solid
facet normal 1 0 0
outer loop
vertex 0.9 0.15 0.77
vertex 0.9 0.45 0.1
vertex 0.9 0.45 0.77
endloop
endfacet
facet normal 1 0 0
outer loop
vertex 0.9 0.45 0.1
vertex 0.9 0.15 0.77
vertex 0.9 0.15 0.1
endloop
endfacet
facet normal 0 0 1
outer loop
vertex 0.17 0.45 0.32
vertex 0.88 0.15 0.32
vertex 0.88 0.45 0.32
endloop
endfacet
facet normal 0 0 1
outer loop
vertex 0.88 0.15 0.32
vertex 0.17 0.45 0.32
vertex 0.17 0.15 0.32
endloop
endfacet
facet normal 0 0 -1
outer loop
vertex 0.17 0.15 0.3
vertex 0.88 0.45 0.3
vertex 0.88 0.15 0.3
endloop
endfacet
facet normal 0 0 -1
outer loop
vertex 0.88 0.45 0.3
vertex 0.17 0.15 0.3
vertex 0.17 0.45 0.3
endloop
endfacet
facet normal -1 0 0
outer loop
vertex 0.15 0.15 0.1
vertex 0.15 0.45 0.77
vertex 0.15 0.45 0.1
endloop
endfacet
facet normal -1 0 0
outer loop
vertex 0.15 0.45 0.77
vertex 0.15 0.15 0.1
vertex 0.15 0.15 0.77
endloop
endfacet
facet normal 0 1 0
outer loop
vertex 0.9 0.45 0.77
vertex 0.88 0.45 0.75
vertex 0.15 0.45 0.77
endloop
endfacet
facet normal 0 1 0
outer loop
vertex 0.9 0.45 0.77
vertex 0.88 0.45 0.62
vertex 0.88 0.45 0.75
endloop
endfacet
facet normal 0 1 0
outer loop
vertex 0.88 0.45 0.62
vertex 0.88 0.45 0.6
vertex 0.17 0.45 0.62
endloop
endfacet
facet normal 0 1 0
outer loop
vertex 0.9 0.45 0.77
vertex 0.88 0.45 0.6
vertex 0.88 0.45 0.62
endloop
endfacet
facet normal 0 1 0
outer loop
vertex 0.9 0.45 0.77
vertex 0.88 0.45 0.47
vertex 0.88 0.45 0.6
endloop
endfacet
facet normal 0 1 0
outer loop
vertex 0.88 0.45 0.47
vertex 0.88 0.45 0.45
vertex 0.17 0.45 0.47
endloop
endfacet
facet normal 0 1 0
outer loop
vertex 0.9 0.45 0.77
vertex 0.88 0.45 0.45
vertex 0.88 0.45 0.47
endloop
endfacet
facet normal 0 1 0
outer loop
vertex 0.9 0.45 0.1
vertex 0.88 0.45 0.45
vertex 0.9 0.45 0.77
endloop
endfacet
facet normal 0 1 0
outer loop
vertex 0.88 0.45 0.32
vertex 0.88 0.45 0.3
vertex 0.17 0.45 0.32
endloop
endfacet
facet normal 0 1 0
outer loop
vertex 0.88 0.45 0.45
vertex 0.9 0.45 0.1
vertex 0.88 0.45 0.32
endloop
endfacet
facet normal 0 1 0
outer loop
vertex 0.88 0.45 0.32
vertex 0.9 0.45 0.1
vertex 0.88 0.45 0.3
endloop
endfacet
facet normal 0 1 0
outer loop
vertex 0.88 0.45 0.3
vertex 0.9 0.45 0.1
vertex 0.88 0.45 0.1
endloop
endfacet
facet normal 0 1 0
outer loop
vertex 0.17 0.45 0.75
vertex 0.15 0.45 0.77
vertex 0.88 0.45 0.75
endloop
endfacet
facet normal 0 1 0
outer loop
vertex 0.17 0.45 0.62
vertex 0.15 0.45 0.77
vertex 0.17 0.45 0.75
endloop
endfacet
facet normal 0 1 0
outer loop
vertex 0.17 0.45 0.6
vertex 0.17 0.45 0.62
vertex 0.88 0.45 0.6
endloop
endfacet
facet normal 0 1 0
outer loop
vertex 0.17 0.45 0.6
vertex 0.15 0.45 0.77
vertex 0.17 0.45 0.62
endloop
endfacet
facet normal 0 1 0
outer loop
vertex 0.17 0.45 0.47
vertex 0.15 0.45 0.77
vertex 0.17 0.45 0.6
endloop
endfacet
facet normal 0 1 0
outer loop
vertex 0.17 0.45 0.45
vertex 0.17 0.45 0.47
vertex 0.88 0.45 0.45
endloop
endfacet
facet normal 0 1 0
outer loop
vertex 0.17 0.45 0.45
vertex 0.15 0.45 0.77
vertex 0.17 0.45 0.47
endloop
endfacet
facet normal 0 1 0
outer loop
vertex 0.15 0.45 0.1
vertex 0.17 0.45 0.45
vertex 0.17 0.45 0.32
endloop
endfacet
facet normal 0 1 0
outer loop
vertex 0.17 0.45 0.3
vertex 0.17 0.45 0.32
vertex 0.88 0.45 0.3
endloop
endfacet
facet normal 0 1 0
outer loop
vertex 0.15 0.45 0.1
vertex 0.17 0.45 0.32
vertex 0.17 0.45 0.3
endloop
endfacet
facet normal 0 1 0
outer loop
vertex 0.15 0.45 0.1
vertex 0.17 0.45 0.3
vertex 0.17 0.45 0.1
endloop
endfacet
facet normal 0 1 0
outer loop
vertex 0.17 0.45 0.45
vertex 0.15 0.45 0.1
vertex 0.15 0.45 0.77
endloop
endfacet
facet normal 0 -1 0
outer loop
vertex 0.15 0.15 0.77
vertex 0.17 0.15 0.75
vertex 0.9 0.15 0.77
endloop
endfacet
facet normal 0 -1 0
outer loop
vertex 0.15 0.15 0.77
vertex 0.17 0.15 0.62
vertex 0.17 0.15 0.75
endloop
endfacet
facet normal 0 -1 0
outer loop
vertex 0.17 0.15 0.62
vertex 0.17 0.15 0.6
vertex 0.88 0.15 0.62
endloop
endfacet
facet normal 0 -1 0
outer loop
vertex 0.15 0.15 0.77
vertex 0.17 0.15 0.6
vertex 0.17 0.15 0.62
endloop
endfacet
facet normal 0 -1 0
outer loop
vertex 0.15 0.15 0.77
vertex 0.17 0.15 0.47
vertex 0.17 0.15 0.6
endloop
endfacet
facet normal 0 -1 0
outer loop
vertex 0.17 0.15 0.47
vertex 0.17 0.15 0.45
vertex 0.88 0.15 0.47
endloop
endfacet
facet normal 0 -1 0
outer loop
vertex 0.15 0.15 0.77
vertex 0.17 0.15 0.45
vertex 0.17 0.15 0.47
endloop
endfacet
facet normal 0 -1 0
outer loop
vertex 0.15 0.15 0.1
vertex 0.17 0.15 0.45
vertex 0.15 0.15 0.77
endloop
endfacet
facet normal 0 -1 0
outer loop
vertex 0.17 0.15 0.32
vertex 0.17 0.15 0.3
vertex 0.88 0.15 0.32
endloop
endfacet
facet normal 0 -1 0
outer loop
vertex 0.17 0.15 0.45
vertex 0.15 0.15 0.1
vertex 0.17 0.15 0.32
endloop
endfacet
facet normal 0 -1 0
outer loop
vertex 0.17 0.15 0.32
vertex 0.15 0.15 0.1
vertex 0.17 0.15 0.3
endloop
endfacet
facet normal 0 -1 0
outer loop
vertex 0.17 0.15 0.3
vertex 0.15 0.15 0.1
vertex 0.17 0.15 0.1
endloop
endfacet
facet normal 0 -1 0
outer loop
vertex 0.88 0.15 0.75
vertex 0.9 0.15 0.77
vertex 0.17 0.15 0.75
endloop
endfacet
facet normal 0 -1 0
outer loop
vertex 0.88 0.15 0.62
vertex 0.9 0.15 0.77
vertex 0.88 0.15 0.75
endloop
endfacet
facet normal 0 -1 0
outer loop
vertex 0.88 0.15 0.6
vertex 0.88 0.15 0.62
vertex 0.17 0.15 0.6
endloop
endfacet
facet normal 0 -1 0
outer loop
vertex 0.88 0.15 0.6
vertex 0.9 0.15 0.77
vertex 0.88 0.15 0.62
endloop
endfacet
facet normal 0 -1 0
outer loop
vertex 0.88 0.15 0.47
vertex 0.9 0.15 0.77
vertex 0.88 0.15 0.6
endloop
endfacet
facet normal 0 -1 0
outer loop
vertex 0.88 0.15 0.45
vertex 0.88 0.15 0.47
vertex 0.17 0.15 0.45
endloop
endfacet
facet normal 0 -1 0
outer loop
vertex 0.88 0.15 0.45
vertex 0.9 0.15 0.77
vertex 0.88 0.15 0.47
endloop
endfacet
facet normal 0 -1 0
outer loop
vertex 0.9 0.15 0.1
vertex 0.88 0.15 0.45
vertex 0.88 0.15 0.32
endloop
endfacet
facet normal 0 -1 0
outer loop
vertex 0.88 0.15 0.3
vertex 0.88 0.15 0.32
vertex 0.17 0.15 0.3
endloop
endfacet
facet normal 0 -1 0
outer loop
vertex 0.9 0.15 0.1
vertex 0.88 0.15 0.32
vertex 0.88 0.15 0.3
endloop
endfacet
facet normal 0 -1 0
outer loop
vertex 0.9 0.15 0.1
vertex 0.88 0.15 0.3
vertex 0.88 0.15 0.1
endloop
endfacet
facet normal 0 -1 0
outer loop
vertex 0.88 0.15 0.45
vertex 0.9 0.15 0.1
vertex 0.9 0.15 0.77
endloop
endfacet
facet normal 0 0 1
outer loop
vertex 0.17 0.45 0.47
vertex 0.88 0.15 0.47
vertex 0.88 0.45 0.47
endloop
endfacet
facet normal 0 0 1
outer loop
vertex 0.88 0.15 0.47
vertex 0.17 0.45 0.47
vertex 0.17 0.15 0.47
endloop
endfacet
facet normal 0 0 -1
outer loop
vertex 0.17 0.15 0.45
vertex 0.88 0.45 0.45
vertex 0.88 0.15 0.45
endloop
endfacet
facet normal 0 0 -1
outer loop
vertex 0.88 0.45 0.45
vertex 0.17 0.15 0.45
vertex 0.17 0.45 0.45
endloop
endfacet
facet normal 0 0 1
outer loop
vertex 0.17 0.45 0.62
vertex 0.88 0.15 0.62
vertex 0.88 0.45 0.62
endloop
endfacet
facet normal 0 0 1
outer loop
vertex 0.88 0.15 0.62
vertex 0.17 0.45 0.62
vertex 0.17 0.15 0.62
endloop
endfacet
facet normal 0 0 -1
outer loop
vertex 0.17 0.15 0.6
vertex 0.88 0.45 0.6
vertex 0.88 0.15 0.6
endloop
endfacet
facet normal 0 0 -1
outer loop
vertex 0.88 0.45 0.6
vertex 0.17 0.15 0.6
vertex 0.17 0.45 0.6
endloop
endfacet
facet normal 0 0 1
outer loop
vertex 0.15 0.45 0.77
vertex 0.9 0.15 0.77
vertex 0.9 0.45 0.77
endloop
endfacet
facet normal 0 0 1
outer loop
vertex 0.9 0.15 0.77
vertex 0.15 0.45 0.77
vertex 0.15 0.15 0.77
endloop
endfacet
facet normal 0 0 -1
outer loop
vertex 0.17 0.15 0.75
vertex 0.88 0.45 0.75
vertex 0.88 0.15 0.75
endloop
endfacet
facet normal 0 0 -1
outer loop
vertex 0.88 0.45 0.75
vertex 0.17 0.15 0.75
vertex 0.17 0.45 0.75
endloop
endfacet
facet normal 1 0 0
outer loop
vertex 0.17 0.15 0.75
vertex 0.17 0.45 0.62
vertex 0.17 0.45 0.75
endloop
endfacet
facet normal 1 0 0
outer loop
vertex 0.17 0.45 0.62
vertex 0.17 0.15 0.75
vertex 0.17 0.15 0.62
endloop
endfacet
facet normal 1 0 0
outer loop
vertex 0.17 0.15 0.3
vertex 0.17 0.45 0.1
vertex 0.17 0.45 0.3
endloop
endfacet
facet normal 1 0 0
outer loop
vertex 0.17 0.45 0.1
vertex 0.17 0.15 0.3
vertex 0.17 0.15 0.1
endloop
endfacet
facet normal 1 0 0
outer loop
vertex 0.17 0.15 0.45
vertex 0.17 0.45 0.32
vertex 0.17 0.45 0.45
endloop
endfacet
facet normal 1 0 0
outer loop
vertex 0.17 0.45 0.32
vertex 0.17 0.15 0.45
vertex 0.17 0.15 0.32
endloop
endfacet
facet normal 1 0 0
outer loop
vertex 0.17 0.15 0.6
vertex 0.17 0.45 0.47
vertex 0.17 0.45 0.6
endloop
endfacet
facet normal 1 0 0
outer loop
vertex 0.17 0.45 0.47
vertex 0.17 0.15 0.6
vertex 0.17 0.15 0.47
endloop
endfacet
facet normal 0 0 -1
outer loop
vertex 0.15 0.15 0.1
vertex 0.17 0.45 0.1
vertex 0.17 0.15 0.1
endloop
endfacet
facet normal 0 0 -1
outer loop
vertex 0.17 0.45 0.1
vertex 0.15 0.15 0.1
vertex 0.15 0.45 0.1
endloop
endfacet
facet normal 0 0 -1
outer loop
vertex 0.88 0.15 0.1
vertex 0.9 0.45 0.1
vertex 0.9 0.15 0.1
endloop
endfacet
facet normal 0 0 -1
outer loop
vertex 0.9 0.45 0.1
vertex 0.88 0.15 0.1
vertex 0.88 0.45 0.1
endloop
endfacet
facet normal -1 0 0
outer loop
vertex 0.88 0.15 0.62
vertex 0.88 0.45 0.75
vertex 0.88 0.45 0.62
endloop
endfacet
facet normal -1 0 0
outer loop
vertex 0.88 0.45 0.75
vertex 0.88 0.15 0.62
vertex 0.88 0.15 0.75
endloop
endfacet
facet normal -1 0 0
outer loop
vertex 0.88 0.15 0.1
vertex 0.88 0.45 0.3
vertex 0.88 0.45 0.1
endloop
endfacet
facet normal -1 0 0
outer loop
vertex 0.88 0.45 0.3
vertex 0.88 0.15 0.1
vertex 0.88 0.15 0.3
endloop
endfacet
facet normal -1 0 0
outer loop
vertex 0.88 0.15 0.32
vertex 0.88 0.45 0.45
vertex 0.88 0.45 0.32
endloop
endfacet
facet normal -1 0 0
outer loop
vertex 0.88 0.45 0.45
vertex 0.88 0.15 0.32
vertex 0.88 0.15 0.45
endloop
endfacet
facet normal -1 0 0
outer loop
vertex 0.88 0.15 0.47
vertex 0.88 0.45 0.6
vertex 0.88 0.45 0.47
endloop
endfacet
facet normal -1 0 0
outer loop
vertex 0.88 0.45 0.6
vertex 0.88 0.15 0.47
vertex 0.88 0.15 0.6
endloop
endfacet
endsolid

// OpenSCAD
color([0.6, 0.4, 0.2])
translate([0.15, 0.15, 0.1]) {
    // Shelf 
    for(z=[0.2 : .15 : .75]) {
        translate([0,0,z])
        cube([.75, 0.3, 0.02]);
    }
    translate([0.0, 0, 0.0])
    cube([.02, 0.3, .65]);

    translate([0.73, 0, 0.0])
    cube([.02, 0.3, .65]);
}
